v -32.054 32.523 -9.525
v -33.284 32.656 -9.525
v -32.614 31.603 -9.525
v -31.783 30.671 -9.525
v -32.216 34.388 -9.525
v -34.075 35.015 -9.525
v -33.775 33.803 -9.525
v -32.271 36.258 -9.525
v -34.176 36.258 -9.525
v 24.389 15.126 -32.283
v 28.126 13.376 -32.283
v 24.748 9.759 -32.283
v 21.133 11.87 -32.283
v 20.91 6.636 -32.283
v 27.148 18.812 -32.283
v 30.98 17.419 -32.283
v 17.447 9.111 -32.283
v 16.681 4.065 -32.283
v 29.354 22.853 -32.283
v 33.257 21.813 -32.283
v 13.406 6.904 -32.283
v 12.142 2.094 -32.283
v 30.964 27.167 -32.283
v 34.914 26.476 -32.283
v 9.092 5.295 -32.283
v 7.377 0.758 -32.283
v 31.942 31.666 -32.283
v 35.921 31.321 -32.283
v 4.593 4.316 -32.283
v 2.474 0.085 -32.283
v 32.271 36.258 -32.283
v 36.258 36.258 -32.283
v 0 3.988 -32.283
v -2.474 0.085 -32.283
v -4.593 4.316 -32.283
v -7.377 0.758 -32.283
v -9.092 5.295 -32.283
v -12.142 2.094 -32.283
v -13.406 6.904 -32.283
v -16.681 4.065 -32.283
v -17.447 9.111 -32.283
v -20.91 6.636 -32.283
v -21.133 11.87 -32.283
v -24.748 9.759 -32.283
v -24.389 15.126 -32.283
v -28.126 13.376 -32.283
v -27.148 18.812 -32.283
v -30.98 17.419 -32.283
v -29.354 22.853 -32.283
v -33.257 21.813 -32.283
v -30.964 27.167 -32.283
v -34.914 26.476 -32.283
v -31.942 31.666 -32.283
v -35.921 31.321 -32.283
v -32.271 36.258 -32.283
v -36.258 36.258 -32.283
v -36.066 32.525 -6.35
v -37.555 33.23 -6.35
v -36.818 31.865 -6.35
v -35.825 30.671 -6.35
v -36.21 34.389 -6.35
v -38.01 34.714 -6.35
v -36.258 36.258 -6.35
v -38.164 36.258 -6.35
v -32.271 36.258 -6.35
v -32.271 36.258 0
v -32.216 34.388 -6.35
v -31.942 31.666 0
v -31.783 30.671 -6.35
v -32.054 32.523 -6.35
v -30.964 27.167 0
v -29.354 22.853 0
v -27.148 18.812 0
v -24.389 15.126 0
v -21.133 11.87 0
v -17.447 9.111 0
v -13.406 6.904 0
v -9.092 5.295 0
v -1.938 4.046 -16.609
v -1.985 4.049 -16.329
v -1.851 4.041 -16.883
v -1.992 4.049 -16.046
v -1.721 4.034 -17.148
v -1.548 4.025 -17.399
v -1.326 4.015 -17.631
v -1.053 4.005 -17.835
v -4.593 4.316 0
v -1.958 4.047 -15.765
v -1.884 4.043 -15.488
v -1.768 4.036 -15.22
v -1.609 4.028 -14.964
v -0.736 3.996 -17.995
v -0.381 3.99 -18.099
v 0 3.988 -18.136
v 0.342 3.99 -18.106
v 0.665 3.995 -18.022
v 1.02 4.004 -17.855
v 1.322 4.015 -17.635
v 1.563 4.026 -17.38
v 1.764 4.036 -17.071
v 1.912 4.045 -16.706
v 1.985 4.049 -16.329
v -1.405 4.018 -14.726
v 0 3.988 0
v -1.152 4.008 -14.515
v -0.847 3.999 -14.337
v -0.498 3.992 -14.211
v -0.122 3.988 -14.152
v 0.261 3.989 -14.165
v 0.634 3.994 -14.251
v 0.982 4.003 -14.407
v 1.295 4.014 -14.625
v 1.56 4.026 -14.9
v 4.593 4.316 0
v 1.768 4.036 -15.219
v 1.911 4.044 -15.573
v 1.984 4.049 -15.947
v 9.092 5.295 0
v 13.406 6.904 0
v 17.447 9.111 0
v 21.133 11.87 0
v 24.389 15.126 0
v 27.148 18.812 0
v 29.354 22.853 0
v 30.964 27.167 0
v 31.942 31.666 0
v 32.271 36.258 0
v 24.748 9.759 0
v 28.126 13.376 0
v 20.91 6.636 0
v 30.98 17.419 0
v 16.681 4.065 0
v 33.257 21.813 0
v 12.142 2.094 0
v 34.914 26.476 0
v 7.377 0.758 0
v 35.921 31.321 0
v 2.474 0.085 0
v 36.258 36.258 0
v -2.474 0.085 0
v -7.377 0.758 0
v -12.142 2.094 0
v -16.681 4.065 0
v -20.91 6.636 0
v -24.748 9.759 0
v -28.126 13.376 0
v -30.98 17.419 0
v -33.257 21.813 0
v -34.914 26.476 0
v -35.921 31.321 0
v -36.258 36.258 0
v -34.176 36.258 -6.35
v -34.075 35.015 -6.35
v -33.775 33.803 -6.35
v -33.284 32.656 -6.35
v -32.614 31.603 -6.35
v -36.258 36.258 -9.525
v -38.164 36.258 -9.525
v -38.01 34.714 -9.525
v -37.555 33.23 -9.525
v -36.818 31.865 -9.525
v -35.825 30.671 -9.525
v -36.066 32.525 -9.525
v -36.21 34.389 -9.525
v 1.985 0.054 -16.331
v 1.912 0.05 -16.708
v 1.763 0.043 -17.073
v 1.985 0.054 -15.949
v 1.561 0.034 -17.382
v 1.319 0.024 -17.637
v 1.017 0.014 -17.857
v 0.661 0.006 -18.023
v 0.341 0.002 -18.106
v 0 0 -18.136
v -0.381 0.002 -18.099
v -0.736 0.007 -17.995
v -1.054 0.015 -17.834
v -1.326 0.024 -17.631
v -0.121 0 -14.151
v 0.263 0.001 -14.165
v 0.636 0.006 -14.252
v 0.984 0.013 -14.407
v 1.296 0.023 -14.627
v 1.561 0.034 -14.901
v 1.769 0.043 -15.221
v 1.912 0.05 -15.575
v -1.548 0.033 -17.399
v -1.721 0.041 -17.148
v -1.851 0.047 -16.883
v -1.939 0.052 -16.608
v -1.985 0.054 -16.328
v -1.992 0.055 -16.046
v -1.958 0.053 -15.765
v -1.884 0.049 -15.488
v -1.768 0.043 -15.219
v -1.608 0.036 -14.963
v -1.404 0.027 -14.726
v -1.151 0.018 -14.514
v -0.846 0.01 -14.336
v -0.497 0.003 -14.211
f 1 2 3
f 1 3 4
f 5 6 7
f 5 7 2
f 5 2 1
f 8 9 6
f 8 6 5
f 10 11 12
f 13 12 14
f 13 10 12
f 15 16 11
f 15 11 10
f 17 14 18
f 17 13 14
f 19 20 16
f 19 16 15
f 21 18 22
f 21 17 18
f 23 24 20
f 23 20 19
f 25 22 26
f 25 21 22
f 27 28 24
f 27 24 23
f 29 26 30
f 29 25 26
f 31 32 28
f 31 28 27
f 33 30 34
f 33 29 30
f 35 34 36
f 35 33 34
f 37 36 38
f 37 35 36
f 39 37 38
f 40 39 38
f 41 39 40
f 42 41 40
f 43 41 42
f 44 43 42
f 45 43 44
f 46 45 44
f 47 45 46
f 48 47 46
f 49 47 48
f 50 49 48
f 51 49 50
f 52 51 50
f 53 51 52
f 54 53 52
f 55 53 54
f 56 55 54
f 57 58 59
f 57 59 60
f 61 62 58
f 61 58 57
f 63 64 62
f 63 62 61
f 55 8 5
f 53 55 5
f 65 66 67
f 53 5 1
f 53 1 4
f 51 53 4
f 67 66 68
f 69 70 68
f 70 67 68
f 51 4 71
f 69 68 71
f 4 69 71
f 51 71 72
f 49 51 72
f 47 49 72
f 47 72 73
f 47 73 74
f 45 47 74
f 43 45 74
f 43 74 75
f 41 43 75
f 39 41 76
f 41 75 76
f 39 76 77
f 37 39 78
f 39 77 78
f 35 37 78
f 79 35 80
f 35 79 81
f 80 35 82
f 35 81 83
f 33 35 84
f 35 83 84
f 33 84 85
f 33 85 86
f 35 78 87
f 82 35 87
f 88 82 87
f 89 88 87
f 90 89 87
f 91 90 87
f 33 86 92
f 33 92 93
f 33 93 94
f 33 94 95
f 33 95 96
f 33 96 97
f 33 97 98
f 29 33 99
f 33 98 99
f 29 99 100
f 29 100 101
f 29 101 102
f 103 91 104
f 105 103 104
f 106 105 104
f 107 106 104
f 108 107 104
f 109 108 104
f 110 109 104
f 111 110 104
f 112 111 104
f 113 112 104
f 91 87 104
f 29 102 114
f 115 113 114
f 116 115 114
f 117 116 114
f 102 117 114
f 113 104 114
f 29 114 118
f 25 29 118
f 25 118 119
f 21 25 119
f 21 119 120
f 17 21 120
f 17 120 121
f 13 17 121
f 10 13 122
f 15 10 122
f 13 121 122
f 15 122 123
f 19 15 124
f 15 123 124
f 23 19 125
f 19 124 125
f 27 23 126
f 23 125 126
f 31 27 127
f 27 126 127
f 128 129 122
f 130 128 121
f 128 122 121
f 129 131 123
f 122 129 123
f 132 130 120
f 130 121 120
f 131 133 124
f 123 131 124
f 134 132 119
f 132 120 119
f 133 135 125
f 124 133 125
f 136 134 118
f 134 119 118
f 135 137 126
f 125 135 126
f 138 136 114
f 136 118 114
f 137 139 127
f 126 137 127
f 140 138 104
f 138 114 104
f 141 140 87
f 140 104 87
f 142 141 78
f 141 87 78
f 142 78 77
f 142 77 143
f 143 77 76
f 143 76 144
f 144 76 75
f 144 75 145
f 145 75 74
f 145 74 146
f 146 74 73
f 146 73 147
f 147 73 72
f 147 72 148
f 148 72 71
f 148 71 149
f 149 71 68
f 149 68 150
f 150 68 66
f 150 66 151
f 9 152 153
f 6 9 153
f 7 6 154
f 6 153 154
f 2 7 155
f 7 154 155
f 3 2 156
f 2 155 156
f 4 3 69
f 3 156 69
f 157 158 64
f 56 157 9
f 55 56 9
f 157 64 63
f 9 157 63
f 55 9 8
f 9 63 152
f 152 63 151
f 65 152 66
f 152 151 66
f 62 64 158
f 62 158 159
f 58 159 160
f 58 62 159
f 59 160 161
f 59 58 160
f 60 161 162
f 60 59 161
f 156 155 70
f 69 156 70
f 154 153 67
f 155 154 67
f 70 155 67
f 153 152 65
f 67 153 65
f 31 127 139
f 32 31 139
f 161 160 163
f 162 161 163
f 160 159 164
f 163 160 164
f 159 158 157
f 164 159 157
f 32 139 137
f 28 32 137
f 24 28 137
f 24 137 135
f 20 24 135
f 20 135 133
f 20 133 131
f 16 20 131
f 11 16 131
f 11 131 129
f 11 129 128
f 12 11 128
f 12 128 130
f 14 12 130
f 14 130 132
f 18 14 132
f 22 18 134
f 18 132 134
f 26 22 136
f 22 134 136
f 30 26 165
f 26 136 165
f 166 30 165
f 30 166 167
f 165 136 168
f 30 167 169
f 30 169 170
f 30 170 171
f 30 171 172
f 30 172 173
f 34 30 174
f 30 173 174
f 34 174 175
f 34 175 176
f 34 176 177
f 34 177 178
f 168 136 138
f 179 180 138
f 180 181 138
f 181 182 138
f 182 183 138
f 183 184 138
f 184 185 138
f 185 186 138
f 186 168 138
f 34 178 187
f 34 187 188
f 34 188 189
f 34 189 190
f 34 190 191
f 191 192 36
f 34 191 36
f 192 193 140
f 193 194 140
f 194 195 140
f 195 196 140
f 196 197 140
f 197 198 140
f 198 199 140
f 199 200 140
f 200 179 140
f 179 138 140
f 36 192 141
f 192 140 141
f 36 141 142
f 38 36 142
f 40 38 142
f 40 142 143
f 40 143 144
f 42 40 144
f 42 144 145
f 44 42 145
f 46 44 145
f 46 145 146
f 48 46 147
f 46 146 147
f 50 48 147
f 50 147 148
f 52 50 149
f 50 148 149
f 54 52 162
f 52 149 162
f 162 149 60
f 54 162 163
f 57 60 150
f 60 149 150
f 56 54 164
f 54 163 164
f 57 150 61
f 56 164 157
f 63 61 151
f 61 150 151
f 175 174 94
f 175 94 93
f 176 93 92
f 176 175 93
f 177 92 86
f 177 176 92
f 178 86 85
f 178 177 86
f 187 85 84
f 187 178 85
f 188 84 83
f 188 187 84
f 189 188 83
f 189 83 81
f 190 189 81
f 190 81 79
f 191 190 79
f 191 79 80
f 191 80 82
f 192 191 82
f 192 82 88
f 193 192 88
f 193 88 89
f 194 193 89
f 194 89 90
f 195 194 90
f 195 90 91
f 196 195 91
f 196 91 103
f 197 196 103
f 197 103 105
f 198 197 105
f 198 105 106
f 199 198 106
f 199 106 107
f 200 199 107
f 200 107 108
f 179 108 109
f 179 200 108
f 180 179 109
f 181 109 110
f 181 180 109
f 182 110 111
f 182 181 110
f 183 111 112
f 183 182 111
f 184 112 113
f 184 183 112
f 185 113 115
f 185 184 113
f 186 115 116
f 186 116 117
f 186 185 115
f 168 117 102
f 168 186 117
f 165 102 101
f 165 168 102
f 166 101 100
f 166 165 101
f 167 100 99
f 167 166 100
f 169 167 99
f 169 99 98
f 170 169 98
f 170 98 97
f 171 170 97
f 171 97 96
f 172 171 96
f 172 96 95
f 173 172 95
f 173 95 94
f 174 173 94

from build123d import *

# Parameters (mm, degrees)
BOSS_EXTRUDE1_DEPTH     = 32.2834
CUT_EXTRUDE1_REACH      = 62.594
CUT_EXTRUDE1_END_RADIUS = 32.2707
SKETCH2_R               = 1.9939
BOSS_EXTRUDE2_DEPTH     = 3.175
CUT_EXTRUDE2_DEPTH      = 3.175


with BuildPart() as part:
    # Sketch1 → Boss-Extrude1 (new body)
    with BuildSketch(Plane.XY):
        with BuildLine():
            Line((-36.2585, 36.2585), (-32.2707, 36.2585))
            ThreePointArc((-32.2707, 36.2585), (0, 3.9878), (32.2707, 36.2585))
            Line((32.2707, 36.2585), (36.2585, 36.2585))
            ThreePointArc((36.2585, 36.2585), (0, 0), (-36.2585, 36.2585))
        make_face()
    extrude(amount=-BOSS_EXTRUDE1_DEPTH)

    # Cut-Extrude1: up to this cylinder (the profile starts outside it)
    cut_extrude1_end = Plane(origin=(0, 36.2585, -16.1417), z_dir=(0, 0, 1)) * Cylinder(CUT_EXTRUDE1_END_RADIUS, 190.7294, mode=Mode.PRIVATE)
    # Sketch2 → Cut-Extrude1 (cut, up to the surface)
    with BuildSketch(Plane(origin=(0, 0, 0), x_dir=(1, 0, 0), z_dir=(0, 1, 0)), mode=Mode.PRIVATE) as cut_extrude1_sk1:
        with Locations(Location((0, 16.1417, 0), (0, 0, 90))):
            Circle(SKETCH2_R)
    cut_extrude1_tool1 = extrude(cut_extrude1_sk1.sketch, amount=CUT_EXTRUDE1_REACH, mode=Mode.PRIVATE) - cut_extrude1_end
    add(cut_extrude1_tool1.solids().sort_by_distance((0, 0, -16.1417))[0], mode=Mode.SUBTRACT)

    # Sketch4 → Boss-Extrude2 (add)
    with BuildSketch(Plane.XY.offset(-6.35)):
        with BuildLine():
            Line((-36.2585, 36.2585), (-38.1635, 36.2585))
            ThreePointArc((-38.1635, 36.2585), (-37.555411186, 33.230080338), (-35.825412395, 30.671134883))
            ThreePointArc((-35.825412395, 30.671134883), (-36.150065958, 33.456437642), (-36.2585, 36.2585))
        make_face()
    extrude(amount=-BOSS_EXTRUDE2_DEPTH)

    # Sketch5 → Cut-Extrude2 (cut)
    with BuildSketch(Plane.XY.offset(-6.35)):
        with BuildLine():
            Line((-32.2707, 36.2585), (-34.1757, 36.2585))
            ThreePointArc((-34.1757, 36.2585), (-33.552449463, 33.219498064), (-31.783319989, 30.671134883))
            ThreePointArc((-31.783319989, 30.671134883), (-32.148624099, 33.454209171), (-32.2707, 36.2585))
        make_face()
    extrude(amount=-CUT_EXTRUDE2_DEPTH, mode=Mode.SUBTRACT)


solid = part.part
